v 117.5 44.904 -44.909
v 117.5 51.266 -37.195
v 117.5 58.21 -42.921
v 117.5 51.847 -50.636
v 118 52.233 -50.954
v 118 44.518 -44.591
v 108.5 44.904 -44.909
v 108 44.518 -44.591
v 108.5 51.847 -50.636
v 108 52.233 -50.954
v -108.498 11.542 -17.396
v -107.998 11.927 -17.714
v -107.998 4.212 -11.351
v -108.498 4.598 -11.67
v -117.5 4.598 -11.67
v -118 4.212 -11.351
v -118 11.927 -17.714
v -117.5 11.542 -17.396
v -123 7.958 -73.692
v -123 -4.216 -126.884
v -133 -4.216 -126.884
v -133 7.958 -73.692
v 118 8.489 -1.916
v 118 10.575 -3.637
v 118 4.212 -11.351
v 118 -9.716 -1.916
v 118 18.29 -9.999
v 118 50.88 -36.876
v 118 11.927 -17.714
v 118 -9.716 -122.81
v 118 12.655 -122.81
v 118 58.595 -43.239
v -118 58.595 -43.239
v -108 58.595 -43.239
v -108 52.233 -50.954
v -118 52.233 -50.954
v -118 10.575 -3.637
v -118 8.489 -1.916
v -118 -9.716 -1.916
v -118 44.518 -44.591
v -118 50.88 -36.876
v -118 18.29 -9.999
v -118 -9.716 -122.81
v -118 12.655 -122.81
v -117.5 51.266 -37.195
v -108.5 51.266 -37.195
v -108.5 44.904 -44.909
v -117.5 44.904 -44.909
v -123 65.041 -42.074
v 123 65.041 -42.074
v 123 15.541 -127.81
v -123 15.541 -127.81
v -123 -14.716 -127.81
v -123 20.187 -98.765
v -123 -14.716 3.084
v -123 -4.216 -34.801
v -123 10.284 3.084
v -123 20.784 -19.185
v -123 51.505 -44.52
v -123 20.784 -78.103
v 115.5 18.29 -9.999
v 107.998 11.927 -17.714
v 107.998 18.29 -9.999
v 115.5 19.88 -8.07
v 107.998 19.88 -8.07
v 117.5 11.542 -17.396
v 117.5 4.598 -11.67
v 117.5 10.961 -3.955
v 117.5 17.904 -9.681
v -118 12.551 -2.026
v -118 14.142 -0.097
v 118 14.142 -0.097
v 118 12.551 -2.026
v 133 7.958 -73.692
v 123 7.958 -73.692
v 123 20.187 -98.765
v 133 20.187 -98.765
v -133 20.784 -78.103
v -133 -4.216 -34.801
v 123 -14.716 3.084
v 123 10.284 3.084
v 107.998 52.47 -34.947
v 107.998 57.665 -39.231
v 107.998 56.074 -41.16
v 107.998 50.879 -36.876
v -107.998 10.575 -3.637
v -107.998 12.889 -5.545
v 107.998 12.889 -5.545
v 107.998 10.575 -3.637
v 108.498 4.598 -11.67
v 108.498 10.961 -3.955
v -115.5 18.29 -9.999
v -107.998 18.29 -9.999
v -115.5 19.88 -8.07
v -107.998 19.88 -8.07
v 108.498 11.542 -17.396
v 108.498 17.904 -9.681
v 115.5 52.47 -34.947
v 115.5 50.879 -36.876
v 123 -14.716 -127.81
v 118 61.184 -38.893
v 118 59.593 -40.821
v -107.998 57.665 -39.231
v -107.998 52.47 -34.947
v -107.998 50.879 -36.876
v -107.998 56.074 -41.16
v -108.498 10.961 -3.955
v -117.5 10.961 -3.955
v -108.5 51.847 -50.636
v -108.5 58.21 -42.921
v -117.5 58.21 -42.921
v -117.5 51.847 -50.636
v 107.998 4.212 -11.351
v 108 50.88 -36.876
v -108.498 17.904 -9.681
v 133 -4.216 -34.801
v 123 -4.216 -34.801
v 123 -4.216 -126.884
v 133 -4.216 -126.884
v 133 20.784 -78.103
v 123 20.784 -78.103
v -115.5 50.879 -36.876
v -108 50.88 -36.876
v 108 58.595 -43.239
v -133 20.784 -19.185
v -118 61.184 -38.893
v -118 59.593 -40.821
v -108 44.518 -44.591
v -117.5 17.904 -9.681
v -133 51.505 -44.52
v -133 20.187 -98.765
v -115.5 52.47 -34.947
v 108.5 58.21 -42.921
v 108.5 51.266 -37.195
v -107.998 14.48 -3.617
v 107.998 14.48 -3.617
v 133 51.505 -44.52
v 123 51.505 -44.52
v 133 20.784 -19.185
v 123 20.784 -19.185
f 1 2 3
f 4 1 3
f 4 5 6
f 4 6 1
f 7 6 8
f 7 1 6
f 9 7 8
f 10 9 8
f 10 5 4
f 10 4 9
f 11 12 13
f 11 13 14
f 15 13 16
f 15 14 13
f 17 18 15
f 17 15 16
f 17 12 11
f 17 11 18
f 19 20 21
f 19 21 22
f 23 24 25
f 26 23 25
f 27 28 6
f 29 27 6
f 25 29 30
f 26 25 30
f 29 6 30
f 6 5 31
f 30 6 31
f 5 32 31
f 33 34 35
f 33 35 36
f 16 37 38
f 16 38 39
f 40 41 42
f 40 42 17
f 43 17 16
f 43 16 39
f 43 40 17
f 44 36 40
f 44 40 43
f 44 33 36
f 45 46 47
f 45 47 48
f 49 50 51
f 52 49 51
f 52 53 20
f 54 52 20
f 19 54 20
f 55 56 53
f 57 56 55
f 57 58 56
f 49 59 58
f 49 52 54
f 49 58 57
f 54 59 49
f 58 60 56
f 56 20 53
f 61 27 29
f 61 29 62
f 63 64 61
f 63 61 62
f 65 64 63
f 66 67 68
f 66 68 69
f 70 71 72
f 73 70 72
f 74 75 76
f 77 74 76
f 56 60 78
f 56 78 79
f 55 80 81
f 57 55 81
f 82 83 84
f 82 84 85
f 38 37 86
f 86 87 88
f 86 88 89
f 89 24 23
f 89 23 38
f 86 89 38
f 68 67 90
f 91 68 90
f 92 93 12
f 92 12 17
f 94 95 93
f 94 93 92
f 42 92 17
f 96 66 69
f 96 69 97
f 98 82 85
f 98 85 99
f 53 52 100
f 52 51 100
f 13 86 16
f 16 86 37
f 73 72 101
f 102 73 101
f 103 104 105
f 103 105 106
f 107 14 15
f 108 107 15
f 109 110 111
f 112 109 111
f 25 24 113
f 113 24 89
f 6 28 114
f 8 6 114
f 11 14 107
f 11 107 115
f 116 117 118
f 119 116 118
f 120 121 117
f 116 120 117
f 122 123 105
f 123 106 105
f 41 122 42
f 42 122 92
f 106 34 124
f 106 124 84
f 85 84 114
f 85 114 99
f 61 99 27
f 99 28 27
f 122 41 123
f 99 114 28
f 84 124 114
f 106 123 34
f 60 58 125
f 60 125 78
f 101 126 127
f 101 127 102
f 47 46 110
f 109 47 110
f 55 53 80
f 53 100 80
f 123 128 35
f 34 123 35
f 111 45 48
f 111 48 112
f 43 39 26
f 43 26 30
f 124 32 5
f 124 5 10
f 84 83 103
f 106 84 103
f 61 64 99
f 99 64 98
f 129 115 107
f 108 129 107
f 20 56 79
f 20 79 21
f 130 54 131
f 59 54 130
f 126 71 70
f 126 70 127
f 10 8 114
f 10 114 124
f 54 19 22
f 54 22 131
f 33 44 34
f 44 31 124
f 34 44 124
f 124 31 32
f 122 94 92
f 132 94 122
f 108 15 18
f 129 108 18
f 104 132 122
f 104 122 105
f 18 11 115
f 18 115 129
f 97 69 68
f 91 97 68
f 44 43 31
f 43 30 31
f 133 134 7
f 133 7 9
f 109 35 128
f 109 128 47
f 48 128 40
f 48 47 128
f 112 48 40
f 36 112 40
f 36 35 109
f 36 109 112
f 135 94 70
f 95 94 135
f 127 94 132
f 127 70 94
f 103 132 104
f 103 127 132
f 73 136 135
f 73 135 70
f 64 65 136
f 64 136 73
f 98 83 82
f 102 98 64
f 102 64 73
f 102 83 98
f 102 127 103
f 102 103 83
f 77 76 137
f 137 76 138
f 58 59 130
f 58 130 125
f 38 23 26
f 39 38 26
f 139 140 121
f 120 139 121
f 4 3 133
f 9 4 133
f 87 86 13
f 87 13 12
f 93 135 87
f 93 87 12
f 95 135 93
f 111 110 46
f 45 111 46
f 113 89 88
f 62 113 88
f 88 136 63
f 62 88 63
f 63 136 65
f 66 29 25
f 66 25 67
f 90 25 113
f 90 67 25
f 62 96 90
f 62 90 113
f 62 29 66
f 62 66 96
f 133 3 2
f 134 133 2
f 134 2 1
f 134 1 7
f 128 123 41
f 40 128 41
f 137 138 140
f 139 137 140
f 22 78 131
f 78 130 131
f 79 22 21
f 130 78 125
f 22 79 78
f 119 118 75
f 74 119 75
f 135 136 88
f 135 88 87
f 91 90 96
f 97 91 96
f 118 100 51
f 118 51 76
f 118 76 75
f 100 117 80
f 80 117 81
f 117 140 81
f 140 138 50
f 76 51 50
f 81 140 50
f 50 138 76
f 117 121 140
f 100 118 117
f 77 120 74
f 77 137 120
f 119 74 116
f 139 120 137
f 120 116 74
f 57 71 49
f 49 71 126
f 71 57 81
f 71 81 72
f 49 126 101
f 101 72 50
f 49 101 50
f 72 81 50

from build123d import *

# Parameters (mm, degrees)
BOSS_EXTRUDE2_DEPTH  = 123
CUT_EXTRUDE2_DEPTH   = 118
SKETCH4_W            = 236
SKETCH4_H            = 60.975887641
CUT_EXTRUDE3_DEPTH   = 2.5
CUT_EXTRUDE4_DEPTH   = 2.5
BOSS_EXTRUDE4_DEPTH  = 10
SKETCH15_W           = 10
SKETCH15_H           = 10
SKETCH15_W_2         = 9
SKETCH15_H_2         = 9
SKETCH15_W_3         = 10.002299771
SKETCH15_W_4         = 9.002299771
BOSS_EXTRUDE14_DEPTH = 10


with BuildPart() as part:
    # Sketch1 → Boss-Extrude2 (new, symmetric)
    with BuildSketch(Plane(origin=(0, 0, 0), x_dir=(0, 0, -1), z_dir=(1, 0, 0))):
        Polygon((42.073890907, 65.041424054), (127.810405881, 15.541424054), (127.810405881, -14.715701058), (-3.083986323, -14.715701058), (-3.083986323, 10.284298942), align=None)
    extrude(amount=BOSS_EXTRUDE2_DEPTH, both=True)

    # Sketch3 → Cut-Extrude2 (cut, symmetric)
    with BuildSketch(Plane(origin=(0, 0, 0), x_dir=(0, 0, -1), z_dir=(1, 0, 0))):
        Polygon((43.238822658, 58.595347702), (1.916013677, 8.488514516), (1.916013677, -9.715701058), (122.810405881, -9.715701058), (122.810405881, 12.654672708), align=None)
    extrude(amount=CUT_EXTRUDE2_DEPTH, both=True, mode=Mode.SUBTRACT)

    # Sketch4 → Cut-Extrude3 (cut)
    with BuildSketch(Plane(origin=(0, 5.676918447, 6.883665768), x_dir=(1, 0, 0), z_dir=(0, 0.6362425146167643, 0.7714891202046446))):
        with Locations((0, 41.460005351)):
            Rectangle(SKETCH4_W, SKETCH4_H)
    extrude(amount=-CUT_EXTRUDE3_DEPTH, mode=Mode.SUBTRACT)

    # Sketch5 → Cut-Extrude4 (cut)
    with BuildSketch(Plane(origin=(0, 4.08631216, 4.954942968), x_dir=(1, 0, 0), z_dir=(0, 0.6362425146167643, 0.7714891202046446))):
        Polygon((107.577700229, 69.447949171), (107.997700229, 69.447949171), (107.997700229, 62.714644326), (115.5, 62.714644326), (115.5, 62.664644326), (115.5, 62.614644326), (115.5, 62.447949171), (115.5, 20.47206153), (107.997700229, 20.47206153), (107.997700229, 13.47206153), (-107.997700229, 13.47206153), (-107.997700229, 20.47206153), (-115.5, 20.47206153), (-115.5, 62.714644326), (-107.997700229, 62.714644326), (-107.997700229, 69.447949171), align=None)
    extrude(amount=-CUT_EXTRUDE4_DEPTH, mode=Mode.SUBTRACT)

    # Sketch6 → Boss-Extrude4 (add)
    with BuildSketch(Plane.ZY.offset(123)):
        Polygon((-73.692184958, 7.957950111), (-98.764682853, 20.186624411), (-44.520247585, 51.504663714), (-19.185344447, 20.784298942), (-78.102547156, 20.784298942), (-34.801276967, -4.215701058), (-126.884199241, -4.215701058), align=None)
    boss_extrude4 = extrude(amount=BOSS_EXTRUDE4_DEPTH)

    # Mirror1: Boss-Extrude4 across plane
    add(boss_extrude4.mirror(Plane(origin=(0, 0, 0), x_dir=(0, 0, 1), z_dir=(1, 0, 0))))

    # Sketch15 → Boss-Extrude14 (add)
    # profile 1 of 4: a face of its own
    with BuildSketch(Plane(origin=(0, 2.495705874, 3.026220167), x_dir=(-1, 0, 0), z_dir=(0, -0.6362425146167643, -0.7714891202046446))):
        with Locations((-113, 67.716050504)):
            Rectangle(SKETCH15_W, SKETCH15_H)
        with Locations((-113, 67.716050504)):
            Rectangle(SKETCH15_W_2, SKETCH15_H_2, mode=Mode.SUBTRACT)
    # profile 2 of 4: a face of its own
    with BuildSketch(Plane(origin=(0, 2.495705874, 3.026220167), x_dir=(-1, 0, 0), z_dir=(0, -0.6362425146167643, -0.7714891202046446))):
        with Locations((113, 67.716050504)):
            Rectangle(SKETCH15_W, SKETCH15_H)
        with Locations((113, 67.716050504)):
            Rectangle(SKETCH15_W_2, SKETCH15_H_2, mode=Mode.SUBTRACT)
    # profile 3 of 4: a face of its own
    with BuildSketch(Plane(origin=(0, 2.495705874, 3.026220167), x_dir=(-1, 0, 0), z_dir=(0, -0.6362425146167643, -0.7714891202046446))):
        with Locations((-112.998850115, 15.47206153)):
            Rectangle(SKETCH15_W_3, SKETCH15_H)
        with Locations((-112.998850115, 15.47206153)):
            Rectangle(SKETCH15_W_4, SKETCH15_H_2, mode=Mode.SUBTRACT)
    # profile 4 of 4: a face of its own
    with BuildSketch(Plane(origin=(0, 2.495705874, 3.026220167), x_dir=(-1, 0, 0), z_dir=(0, -0.6362425146167643, -0.7714891202046446))):
        with Locations((112.998850115, 15.47206153)):
            Rectangle(SKETCH15_W_3, SKETCH15_H)
        with Locations((112.998850115, 15.47206153)):
            Rectangle(SKETCH15_W_4, SKETCH15_H_2, mode=Mode.SUBTRACT)
    extrude(amount=BOSS_EXTRUDE14_DEPTH)


solid = part.part
